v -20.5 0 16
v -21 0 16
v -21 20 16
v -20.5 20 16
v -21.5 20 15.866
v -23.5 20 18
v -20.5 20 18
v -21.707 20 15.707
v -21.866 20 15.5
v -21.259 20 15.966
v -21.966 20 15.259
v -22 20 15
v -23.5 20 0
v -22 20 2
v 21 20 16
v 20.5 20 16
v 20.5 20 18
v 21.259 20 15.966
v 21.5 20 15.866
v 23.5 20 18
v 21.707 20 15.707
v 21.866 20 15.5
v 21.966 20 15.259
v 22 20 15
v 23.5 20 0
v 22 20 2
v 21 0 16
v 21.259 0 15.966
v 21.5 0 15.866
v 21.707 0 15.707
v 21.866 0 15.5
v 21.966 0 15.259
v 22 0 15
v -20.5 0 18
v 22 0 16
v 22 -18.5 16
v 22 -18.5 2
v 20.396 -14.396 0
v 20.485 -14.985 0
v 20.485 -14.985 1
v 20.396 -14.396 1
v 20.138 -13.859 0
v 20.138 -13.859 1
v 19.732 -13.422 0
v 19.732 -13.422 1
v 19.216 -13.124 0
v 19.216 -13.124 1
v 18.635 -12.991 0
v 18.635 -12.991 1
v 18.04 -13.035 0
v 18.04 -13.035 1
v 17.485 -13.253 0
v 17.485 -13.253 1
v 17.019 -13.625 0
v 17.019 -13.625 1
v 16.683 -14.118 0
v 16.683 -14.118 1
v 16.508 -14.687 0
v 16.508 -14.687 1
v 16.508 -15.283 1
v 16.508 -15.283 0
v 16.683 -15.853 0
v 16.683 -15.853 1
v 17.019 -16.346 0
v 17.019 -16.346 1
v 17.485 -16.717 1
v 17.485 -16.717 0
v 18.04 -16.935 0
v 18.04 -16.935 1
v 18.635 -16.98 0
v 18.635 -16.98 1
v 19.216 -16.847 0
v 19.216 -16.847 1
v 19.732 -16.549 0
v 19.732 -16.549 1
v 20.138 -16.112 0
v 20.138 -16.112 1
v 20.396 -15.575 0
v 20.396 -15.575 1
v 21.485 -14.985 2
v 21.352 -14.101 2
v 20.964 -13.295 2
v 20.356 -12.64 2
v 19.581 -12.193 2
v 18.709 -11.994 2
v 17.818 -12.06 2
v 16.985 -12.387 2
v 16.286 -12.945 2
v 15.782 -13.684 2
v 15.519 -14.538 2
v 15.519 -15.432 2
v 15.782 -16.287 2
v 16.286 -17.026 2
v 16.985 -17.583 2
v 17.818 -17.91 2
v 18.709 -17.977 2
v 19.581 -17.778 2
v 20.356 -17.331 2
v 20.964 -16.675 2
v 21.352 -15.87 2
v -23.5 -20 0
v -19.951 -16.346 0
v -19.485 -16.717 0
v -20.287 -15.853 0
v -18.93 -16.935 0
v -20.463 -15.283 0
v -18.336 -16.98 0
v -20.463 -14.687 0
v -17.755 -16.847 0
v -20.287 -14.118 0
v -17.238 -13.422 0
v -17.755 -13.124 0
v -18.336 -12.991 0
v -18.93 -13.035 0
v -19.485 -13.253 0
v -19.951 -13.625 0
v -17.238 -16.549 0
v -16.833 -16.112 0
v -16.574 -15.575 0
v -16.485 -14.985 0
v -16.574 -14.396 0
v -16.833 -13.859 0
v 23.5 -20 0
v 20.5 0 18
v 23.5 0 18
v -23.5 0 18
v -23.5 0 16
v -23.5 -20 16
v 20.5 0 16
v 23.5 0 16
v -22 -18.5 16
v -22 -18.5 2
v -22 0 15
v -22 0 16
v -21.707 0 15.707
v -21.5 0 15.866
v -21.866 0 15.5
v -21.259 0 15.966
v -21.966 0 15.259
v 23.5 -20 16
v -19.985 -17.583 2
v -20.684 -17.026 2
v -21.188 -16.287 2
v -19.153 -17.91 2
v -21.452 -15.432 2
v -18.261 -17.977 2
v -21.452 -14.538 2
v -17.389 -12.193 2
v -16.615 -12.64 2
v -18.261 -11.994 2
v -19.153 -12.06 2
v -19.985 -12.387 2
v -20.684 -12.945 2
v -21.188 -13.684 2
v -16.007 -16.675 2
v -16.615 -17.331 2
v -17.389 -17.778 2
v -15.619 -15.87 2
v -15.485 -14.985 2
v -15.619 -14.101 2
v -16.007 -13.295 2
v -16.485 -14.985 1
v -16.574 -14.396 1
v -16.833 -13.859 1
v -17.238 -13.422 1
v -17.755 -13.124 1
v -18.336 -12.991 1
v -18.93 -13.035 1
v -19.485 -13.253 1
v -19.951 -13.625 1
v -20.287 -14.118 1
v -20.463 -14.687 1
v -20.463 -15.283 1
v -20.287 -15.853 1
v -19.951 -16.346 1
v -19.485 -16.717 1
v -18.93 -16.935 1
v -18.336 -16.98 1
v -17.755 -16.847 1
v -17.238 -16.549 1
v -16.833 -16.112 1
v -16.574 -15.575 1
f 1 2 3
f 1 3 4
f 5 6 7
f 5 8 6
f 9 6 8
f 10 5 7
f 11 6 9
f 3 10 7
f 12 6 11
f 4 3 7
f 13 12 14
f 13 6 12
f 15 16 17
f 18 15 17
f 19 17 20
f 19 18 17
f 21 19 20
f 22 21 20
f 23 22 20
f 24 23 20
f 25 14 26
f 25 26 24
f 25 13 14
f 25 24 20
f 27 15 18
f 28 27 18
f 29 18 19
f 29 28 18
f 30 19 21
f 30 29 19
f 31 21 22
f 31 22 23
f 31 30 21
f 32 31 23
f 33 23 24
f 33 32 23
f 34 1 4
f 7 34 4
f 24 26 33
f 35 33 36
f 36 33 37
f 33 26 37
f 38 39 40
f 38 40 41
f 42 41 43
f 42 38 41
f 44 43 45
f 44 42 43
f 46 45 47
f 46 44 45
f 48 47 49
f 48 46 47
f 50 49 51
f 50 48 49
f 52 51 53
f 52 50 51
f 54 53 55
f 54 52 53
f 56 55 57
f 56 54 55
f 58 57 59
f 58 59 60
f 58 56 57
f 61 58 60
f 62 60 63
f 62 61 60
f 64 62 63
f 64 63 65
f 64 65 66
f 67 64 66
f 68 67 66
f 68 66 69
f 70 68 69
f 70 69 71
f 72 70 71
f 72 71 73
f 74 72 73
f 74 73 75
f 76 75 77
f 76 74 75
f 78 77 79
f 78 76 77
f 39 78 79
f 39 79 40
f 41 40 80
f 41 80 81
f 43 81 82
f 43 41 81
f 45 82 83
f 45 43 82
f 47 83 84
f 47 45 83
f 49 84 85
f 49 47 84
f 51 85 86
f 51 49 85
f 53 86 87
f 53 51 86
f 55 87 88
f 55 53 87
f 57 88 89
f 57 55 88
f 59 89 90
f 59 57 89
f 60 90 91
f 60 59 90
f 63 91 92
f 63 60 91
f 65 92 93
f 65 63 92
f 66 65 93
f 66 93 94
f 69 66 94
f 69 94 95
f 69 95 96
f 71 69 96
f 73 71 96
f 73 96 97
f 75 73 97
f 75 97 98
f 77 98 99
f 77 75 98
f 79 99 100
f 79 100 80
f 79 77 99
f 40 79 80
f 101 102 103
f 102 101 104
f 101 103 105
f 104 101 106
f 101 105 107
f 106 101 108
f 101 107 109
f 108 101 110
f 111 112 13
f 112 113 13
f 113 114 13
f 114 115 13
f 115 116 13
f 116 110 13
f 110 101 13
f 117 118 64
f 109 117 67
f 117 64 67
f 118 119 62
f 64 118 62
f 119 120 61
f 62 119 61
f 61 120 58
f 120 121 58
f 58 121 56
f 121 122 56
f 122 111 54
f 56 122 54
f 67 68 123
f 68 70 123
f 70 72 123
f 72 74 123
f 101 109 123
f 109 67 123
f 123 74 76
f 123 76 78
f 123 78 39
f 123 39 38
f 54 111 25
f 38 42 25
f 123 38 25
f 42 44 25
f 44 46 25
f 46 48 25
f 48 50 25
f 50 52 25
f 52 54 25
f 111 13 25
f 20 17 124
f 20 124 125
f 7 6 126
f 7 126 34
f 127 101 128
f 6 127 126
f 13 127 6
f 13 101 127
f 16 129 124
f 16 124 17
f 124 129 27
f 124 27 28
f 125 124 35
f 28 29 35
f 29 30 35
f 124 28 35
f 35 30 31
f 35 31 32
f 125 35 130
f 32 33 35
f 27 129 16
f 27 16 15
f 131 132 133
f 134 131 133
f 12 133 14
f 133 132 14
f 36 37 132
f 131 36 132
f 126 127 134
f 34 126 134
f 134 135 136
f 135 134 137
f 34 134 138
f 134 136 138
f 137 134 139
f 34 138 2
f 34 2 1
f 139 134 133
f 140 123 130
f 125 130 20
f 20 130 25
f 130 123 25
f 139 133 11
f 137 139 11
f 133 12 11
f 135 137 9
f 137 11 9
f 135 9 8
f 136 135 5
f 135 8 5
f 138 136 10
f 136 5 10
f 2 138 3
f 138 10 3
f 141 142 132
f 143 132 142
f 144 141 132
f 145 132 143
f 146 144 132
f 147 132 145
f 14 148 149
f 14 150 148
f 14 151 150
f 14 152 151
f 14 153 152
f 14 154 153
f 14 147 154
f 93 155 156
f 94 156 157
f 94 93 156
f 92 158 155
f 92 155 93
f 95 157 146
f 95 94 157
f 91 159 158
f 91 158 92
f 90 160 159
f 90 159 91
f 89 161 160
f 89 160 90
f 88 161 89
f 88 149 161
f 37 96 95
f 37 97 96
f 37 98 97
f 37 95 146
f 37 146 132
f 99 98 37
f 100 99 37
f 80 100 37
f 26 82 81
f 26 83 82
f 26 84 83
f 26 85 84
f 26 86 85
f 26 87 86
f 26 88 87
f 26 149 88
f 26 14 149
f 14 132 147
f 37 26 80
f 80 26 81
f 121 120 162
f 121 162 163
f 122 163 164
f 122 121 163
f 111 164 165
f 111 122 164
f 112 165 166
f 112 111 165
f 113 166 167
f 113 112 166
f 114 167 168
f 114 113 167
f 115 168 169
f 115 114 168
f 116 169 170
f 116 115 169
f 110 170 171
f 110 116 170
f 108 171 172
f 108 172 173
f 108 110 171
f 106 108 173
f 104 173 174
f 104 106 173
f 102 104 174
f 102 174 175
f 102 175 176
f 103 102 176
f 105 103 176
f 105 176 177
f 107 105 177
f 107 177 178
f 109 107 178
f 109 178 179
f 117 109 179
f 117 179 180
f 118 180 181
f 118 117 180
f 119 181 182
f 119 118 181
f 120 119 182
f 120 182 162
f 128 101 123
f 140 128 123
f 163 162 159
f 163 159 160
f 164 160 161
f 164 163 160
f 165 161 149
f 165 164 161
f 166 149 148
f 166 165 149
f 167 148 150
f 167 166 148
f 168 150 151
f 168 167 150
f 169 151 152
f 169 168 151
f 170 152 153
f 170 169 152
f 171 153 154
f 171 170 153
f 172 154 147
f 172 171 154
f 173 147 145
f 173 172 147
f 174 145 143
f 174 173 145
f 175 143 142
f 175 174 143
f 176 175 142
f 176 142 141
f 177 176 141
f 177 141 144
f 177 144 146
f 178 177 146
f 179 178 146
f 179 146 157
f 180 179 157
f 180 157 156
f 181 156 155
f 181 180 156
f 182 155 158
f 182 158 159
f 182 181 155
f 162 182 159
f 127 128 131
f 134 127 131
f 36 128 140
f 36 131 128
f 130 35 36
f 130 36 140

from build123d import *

# Parameters (mm, degrees)
SKETCH_W      = 47
SKETCH_H      = 40
SKETCH_R      = 2
PAD_DEPTH     = 2
PAD001_DEPTH  = 14
SKETCH002_W   = 3
SKETCH002_H   = 20
PAD002_DEPTH  = 2
FILLET_R      = 1
FILLET001_R   = 1
CHAMFER_ANGLE = 45
CHAMFER_SIZE  = 1


with BuildPart() as part:
    # Sketch → Pad (new body)
    with BuildSketch(Plane.XY):
        Rectangle(SKETCH_W, SKETCH_H)
        with Locations((-18.485281, -14.985281)):
            Circle(SKETCH_R, mode=Mode.SUBTRACT)
        with Locations((18.485281, -14.985281)):
            Circle(SKETCH_R, mode=Mode.SUBTRACT)
    extrude(amount=PAD_DEPTH)

    # Sketch001 (on Face8 of Pad) → Pad001 (join)
    with BuildSketch(Plane.XY.offset(2)):
        Polygon((-23.5, -20), (23.5, -20), (23.5, 20), (22, 20), (22, -18.5), (-22, -18.5), (-22, 20), (-23.5, 20), align=None)
    extrude(amount=PAD001_DEPTH)

    # Sketch002 (on Face14 of Pad001) → Pad002 (join)
    with BuildSketch(Plane.XY.offset(16)):
        with Locations((-22, 10)):
            Rectangle(SKETCH002_W, SKETCH002_H)
        with Locations((22, 10)):
            Rectangle(SKETCH002_W, SKETCH002_H)
    extrude(amount=PAD002_DEPTH)

    # Fillet
    fillet_edges = [part.edges().sort_by_distance(p)[0] for p in [
        (22, 10, 16),
    ]]
    fillet(fillet_edges, radius=FILLET_R)

    # Fillet001
    fillet001_edges = [part.edges().sort_by_distance(p)[0] for p in [
        (-22, 10, 16),
    ]]
    fillet(fillet001_edges, radius=FILLET001_R)

    # Chamfer
    chamfer_edges = [part.edges().sort_by_distance(p)[0] for p in [
        (16.485281, -14.985281, 2),
        (-20.485281, -14.985281, 2),
    ]]
    chamfer_side = part.faces().sort_by_distance((0, 0.98697, 2))[0]
    chamfer(chamfer_edges, length=CHAMFER_SIZE, angle=CHAMFER_ANGLE, reference=chamfer_side)


solid = part.part
